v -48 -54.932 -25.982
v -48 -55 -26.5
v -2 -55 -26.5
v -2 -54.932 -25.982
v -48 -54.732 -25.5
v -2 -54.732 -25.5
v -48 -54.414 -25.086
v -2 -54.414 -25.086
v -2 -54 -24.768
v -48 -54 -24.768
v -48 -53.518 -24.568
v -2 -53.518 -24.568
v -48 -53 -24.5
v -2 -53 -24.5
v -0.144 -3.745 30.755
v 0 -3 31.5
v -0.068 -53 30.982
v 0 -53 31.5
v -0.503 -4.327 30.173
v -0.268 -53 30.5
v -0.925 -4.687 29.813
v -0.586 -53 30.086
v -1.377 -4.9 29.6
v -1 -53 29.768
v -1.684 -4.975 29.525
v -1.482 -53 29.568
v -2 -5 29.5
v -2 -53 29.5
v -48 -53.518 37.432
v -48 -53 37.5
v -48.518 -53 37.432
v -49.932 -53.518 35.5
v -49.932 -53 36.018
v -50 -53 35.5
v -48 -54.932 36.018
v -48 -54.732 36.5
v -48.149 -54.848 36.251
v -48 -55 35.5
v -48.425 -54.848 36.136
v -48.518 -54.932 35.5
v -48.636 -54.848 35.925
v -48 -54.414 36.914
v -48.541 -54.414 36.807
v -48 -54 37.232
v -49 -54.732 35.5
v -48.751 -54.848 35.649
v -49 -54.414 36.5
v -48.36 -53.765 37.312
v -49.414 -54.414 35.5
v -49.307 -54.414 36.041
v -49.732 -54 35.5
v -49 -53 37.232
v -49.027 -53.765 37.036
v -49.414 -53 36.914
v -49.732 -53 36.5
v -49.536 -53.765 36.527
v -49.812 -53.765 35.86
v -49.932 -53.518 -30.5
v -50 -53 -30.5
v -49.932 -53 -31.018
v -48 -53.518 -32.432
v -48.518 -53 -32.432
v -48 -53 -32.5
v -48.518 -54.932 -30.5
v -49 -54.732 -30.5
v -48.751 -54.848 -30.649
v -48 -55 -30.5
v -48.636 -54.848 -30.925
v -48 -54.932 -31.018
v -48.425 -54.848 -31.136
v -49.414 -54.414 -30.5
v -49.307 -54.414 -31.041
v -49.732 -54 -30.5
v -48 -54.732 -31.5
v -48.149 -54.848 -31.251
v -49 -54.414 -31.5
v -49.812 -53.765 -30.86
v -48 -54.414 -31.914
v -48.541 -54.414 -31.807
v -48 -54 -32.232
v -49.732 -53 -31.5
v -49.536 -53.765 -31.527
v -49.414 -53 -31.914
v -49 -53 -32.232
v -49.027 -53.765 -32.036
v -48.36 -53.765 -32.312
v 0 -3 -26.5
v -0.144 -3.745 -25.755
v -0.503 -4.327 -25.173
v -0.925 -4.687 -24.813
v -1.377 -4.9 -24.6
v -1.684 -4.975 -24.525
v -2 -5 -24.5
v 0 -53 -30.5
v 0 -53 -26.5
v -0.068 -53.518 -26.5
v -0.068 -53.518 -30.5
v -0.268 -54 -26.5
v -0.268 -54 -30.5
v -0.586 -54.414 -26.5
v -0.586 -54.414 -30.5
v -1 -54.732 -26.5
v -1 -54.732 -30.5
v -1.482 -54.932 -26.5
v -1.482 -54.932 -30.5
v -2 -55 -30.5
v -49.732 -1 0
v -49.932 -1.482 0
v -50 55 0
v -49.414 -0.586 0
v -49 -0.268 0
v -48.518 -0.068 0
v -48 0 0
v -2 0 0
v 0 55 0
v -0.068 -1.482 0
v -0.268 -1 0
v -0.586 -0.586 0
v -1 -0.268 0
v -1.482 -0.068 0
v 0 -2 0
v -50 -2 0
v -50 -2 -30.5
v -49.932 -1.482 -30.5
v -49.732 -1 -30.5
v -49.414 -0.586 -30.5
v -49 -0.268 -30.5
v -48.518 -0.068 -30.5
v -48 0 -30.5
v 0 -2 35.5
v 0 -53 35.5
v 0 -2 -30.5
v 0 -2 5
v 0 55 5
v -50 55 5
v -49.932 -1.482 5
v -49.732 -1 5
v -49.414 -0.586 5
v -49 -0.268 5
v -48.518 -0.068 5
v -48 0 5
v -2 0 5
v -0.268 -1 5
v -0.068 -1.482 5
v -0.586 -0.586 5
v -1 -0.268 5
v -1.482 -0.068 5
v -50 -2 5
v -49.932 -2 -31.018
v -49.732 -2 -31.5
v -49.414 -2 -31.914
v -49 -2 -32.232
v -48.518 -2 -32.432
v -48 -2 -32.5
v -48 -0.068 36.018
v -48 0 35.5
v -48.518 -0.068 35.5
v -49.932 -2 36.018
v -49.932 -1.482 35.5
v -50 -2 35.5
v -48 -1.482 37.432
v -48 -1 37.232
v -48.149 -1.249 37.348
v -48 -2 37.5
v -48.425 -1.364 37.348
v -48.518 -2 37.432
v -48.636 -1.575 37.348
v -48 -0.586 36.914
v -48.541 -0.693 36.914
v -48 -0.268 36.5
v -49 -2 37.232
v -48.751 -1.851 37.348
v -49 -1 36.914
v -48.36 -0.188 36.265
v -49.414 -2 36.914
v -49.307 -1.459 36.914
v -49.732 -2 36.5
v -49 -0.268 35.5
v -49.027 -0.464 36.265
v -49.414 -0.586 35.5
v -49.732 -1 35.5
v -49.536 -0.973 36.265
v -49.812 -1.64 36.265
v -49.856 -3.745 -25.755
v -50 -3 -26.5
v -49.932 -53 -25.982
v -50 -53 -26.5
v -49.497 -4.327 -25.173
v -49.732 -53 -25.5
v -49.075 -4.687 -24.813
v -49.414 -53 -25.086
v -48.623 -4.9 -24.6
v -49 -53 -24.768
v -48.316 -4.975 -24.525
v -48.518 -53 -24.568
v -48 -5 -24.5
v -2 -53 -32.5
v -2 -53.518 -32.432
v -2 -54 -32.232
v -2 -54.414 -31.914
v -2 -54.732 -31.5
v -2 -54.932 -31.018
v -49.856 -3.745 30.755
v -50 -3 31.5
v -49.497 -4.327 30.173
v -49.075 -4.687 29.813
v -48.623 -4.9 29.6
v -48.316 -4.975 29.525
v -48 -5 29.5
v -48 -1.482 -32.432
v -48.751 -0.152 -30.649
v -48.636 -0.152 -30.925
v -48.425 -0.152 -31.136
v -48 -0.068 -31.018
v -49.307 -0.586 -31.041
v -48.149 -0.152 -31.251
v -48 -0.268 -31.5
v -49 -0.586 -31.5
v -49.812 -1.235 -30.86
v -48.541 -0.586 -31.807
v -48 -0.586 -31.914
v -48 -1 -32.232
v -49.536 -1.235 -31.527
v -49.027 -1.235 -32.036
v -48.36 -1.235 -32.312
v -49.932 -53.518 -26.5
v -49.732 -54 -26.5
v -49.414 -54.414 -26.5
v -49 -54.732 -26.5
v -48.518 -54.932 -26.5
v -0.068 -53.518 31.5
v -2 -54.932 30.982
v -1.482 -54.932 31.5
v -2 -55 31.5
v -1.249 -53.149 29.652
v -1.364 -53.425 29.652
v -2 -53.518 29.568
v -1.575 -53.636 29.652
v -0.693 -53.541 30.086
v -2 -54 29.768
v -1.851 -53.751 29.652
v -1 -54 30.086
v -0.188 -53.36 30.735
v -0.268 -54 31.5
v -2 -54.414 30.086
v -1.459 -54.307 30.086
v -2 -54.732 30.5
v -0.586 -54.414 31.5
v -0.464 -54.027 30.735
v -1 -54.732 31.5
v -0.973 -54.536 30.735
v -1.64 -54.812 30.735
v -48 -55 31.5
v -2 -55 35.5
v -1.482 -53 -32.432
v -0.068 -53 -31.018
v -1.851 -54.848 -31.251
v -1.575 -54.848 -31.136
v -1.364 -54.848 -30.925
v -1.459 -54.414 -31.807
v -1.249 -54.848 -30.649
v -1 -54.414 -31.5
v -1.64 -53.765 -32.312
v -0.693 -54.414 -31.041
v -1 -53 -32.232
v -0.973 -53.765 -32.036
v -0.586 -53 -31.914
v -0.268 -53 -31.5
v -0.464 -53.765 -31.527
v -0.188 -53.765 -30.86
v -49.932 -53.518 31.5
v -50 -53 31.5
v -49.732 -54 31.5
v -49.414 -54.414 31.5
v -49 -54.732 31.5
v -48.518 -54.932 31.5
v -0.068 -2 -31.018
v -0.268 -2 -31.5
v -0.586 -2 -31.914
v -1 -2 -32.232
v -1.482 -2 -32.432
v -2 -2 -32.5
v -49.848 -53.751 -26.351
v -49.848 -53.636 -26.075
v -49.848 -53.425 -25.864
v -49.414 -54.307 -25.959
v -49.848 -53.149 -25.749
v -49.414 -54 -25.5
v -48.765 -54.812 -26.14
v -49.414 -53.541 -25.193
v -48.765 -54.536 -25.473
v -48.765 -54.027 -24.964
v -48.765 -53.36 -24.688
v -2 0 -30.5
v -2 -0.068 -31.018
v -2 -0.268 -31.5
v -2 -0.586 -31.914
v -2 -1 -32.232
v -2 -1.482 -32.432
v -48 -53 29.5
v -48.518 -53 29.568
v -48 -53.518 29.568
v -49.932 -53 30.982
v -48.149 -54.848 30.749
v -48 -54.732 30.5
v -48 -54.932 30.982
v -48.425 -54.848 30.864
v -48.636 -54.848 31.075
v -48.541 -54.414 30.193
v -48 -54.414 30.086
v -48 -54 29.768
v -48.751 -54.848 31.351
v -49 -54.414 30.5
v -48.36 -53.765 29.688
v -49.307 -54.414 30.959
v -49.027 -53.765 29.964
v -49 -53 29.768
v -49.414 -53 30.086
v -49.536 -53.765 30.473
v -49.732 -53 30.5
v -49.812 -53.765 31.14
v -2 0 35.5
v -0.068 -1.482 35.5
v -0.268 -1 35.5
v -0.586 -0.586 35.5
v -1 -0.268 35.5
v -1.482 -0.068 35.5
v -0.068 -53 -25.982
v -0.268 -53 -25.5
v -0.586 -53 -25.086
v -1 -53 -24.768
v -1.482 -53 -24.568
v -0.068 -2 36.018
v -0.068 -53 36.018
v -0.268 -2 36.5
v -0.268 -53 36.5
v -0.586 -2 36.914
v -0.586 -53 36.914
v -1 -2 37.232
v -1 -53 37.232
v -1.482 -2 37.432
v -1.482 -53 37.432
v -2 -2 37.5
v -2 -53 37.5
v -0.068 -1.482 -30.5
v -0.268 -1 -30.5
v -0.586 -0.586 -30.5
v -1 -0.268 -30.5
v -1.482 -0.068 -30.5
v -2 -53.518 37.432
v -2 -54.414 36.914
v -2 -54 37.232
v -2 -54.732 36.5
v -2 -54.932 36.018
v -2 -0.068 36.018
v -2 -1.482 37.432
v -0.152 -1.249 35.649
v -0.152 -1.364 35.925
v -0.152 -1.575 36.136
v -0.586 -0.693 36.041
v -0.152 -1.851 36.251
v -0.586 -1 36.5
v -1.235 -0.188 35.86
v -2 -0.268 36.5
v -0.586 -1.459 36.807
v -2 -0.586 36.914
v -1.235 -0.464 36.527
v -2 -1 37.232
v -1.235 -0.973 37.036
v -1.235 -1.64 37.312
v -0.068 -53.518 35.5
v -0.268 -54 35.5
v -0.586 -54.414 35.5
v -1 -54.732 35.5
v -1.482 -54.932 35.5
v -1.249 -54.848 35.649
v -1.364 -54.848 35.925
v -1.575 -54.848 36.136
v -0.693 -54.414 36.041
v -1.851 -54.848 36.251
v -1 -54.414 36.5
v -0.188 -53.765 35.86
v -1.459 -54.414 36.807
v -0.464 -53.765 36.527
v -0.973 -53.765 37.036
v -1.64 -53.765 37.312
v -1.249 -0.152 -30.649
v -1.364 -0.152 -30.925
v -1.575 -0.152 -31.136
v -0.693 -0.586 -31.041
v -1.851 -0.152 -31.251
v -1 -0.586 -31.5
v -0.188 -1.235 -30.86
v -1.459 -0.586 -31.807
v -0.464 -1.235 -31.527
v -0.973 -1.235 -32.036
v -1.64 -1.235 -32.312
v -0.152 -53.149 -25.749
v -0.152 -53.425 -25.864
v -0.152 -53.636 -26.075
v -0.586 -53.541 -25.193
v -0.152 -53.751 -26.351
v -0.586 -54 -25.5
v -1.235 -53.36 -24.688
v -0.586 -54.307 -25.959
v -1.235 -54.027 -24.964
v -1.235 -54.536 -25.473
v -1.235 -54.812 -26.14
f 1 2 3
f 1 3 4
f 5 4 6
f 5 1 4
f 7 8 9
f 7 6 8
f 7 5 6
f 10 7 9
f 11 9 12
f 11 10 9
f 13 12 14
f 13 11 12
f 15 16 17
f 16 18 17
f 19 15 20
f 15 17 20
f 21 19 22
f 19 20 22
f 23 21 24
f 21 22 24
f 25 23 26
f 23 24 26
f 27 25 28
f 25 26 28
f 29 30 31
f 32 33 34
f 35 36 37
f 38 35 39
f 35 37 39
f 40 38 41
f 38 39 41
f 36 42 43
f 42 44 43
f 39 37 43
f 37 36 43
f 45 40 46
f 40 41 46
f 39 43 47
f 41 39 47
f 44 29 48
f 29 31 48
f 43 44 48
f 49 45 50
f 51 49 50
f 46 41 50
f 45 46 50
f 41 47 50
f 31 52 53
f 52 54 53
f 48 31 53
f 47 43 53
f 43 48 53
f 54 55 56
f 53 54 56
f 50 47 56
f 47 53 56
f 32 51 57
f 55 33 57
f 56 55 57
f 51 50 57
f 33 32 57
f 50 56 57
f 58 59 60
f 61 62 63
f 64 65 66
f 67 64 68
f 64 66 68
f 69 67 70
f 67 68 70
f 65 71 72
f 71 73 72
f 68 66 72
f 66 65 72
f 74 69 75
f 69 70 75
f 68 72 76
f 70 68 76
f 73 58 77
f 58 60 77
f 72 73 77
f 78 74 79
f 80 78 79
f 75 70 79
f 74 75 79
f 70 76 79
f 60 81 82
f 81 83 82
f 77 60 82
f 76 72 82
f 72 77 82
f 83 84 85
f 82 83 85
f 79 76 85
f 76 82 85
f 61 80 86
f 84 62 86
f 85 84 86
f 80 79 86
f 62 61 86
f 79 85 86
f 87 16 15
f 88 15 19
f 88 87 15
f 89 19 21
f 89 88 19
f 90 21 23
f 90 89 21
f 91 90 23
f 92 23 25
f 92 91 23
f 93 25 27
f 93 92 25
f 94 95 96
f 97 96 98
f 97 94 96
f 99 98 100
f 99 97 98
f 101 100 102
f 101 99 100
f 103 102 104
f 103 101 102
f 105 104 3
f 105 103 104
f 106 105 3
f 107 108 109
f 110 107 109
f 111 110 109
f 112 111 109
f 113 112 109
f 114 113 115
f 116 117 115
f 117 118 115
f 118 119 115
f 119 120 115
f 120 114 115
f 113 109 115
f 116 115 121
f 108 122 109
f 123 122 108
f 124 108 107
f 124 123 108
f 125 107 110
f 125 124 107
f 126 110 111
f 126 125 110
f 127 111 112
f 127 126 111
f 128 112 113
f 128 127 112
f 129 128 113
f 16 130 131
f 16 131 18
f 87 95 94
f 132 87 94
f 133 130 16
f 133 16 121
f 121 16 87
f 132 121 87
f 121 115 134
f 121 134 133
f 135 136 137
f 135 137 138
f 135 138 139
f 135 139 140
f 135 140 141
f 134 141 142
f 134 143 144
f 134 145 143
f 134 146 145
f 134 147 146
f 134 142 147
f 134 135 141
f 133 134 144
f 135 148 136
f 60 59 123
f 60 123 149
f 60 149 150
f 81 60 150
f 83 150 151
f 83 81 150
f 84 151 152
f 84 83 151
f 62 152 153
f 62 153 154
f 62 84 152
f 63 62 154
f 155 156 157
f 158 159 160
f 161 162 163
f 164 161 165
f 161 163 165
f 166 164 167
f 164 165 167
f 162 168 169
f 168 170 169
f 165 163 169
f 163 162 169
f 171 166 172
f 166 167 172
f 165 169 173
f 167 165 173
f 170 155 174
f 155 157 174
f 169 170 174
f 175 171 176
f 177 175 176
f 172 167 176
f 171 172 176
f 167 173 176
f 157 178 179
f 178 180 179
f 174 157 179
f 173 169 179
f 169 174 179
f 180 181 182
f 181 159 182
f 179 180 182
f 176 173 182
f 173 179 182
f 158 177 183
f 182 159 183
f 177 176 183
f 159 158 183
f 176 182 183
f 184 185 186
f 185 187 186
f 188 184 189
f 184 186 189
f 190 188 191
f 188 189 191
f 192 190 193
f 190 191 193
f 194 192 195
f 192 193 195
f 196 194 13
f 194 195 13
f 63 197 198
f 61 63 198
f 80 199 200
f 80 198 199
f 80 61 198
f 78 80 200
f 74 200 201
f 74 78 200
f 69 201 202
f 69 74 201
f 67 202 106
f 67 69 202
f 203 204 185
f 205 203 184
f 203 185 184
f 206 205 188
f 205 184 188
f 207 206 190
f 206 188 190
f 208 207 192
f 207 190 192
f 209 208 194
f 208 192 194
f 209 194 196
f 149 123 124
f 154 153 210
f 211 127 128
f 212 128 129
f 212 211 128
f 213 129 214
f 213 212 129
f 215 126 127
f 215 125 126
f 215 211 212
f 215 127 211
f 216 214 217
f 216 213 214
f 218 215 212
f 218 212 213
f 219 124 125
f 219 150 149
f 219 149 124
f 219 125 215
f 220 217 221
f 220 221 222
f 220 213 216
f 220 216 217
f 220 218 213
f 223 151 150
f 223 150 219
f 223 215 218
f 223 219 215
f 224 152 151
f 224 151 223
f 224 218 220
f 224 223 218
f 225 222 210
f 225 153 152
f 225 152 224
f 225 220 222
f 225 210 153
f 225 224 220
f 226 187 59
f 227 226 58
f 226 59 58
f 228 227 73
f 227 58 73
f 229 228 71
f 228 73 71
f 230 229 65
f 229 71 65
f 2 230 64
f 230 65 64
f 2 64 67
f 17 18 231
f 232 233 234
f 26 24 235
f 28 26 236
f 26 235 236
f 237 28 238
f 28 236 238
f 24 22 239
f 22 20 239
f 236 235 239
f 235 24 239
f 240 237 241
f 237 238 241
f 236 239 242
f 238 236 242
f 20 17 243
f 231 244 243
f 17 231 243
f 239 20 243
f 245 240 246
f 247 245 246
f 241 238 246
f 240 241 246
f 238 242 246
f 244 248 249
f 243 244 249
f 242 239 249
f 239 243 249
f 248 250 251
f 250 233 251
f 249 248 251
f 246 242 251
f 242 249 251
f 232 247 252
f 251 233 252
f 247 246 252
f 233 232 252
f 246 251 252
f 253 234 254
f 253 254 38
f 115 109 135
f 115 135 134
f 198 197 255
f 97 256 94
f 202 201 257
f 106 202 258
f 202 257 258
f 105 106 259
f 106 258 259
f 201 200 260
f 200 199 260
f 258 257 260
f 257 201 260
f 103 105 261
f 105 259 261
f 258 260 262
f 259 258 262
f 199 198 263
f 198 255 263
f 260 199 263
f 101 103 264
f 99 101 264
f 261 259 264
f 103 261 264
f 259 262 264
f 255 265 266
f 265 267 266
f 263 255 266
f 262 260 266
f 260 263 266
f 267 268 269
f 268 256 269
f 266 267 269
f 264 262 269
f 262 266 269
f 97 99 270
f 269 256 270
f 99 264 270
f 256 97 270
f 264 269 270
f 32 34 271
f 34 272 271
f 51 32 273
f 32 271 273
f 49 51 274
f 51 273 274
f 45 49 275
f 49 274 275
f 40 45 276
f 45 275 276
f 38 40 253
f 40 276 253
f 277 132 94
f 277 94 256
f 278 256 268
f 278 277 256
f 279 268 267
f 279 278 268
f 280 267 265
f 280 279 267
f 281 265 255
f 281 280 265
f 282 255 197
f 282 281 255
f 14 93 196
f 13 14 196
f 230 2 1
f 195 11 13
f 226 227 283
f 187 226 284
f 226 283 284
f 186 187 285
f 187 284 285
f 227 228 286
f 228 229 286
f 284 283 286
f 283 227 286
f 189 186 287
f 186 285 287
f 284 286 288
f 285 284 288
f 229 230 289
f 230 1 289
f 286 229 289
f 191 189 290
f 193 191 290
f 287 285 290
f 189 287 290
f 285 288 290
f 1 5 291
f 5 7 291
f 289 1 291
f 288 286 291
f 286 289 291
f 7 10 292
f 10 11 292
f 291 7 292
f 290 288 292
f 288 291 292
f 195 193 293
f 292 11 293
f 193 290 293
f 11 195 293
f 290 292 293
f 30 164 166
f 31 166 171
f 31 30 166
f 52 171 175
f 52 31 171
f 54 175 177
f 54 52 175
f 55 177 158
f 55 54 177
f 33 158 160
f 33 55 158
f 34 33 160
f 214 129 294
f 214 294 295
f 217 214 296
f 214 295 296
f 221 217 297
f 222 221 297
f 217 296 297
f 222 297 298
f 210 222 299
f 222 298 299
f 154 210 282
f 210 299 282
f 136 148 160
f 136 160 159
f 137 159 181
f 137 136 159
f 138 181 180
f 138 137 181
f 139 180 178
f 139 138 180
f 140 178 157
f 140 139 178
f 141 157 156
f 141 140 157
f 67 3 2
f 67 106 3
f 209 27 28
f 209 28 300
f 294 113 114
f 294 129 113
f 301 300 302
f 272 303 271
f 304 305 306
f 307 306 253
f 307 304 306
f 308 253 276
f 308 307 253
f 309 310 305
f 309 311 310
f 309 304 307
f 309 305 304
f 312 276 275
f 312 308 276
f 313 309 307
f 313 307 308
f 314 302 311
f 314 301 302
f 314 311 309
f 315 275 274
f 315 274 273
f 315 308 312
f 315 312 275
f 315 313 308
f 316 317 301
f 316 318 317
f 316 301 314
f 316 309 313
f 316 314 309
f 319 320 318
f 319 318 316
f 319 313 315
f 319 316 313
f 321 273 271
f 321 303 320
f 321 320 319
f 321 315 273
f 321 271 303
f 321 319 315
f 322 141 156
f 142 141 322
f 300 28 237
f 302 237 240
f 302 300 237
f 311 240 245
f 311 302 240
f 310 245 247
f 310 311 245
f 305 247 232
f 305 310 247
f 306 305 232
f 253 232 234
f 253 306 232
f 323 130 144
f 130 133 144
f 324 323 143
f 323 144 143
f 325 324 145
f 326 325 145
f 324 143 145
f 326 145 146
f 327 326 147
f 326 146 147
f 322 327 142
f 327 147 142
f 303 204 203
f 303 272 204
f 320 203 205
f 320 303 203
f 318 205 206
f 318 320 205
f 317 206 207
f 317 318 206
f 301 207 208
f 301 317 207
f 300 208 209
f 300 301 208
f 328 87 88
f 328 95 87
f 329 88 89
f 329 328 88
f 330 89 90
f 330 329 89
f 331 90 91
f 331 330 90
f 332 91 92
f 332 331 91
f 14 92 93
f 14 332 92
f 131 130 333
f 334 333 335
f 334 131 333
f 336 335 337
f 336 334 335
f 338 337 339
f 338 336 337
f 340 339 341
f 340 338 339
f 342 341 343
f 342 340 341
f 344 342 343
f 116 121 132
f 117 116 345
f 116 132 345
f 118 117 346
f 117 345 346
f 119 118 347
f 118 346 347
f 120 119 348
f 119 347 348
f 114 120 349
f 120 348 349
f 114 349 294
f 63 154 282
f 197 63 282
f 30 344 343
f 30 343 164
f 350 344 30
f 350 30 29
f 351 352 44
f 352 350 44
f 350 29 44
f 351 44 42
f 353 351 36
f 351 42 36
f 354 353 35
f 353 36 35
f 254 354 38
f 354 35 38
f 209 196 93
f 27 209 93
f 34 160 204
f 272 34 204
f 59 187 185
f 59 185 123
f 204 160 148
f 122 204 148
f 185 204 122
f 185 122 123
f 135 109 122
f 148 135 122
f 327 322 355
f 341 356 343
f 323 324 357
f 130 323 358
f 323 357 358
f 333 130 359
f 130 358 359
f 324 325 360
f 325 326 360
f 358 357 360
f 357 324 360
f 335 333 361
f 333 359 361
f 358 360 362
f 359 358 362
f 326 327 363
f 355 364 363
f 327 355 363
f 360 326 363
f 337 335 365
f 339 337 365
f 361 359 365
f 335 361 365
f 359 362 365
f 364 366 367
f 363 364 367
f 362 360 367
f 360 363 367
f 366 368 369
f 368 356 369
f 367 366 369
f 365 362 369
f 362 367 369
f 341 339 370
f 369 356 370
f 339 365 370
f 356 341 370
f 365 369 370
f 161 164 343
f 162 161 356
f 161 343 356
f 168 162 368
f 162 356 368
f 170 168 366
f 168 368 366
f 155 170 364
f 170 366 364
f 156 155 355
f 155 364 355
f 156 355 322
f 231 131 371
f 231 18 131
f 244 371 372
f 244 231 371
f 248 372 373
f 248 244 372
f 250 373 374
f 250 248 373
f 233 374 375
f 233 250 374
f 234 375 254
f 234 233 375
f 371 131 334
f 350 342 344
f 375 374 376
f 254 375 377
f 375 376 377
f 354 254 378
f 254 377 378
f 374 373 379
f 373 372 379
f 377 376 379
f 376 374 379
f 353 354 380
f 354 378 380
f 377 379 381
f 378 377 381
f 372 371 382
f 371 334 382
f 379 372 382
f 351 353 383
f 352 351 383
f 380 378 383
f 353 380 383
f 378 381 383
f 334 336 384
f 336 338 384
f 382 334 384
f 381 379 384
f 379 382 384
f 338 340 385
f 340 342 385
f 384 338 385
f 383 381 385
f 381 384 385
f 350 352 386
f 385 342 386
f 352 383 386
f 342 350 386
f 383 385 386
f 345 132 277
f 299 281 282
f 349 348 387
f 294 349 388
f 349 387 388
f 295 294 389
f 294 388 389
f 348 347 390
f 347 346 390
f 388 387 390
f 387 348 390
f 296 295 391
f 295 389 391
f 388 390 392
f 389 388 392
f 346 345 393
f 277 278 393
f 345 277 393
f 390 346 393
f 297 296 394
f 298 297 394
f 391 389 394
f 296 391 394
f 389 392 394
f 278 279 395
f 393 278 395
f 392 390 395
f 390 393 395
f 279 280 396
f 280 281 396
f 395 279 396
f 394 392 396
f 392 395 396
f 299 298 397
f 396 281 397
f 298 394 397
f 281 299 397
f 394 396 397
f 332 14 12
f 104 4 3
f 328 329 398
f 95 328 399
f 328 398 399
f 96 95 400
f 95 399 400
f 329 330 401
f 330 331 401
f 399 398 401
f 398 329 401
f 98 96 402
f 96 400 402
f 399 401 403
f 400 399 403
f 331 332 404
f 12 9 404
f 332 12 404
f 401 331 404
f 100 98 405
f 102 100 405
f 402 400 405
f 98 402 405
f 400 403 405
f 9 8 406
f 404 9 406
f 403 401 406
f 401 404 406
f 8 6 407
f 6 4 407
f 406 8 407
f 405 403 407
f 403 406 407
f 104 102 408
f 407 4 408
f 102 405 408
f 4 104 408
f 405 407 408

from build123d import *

# Parameters (mm, degrees)
SKETCH1_W           = 50
SKETCH1_H           = 55
BOSS_EXTRUDE1_DEPTH = 5
SKETCH2_W           = 50
SKETCH2_H           = 70
BOSS_EXTRUDE2_DEPTH = 5
SKETCH3_W           = 50
SKETCH3_H           = 8
BOSS_EXTRUDE3_DEPTH = 50
FILLET1_R           = 2


with BuildPart() as part:
    # Sketch1 → Boss-Extrude1 (new body)
    with BuildSketch(Plane.XY):
        with Locations((-25, 27.5)):
            Rectangle(SKETCH1_W, SKETCH1_H)
    extrude(amount=BOSS_EXTRUDE1_DEPTH)

    # Sketch2 → Boss-Extrude2 (add)
    with BuildSketch(Plane(origin=(0, 0, 0), x_dir=(1, 0, 0), z_dir=(0, 1, 0))):
        with Locations((-25, -2.5)):
            Rectangle(SKETCH2_W, SKETCH2_H)
    extrude(amount=-BOSS_EXTRUDE2_DEPTH)

    # Sketch3 → Boss-Extrude3 (add)
    with BuildSketch(Plane(origin=(0, -5, 0), x_dir=(-1, 0, 0), z_dir=(0, -1, 0))):
        with Locations((25, -33.5)):
            Rectangle(SKETCH3_W, SKETCH3_H)
        with Locations((25, 28.5)):
            Rectangle(SKETCH3_W, SKETCH3_H)
    extrude(amount=BOSS_EXTRUDE3_DEPTH)

    # Fillet1
    fillet1_edges = [part.edges().sort_by_distance(p)[0] for p in [
        (-50, 0, 21.25),
        (-25, 0, 37.5),
        (0, 0, 21.25),
        (-50, -27.5, 37.5),
        (-50, -27.5, -32.5),
        (0, -27.5, -32.5),
        (0, -27.5, 37.5),
        (-50, 0, -16.25),
        (0, 0, -16.25),
        (-25, 0, -32.5),
        (0, -5, 2.5),
        (-50, -30, 29.5),
        (0, -55, 33.5),
        (0, -30, 29.5),
        (-25, -55, 37.5),
        (-25, -55, 29.5),
        (-50, -55, 33.5),
        (-50, -5, 2.5),
        (-25, -55, -24.5),
        (0, -30, -24.5),
        (-50, -55, -28.5),
        (-50, -30, -24.5),
        (-25, -55, -32.5),
        (0, -55, -28.5),
    ]]
    fillet(fillet1_edges, radius=FILLET1_R)


solid = part.part
